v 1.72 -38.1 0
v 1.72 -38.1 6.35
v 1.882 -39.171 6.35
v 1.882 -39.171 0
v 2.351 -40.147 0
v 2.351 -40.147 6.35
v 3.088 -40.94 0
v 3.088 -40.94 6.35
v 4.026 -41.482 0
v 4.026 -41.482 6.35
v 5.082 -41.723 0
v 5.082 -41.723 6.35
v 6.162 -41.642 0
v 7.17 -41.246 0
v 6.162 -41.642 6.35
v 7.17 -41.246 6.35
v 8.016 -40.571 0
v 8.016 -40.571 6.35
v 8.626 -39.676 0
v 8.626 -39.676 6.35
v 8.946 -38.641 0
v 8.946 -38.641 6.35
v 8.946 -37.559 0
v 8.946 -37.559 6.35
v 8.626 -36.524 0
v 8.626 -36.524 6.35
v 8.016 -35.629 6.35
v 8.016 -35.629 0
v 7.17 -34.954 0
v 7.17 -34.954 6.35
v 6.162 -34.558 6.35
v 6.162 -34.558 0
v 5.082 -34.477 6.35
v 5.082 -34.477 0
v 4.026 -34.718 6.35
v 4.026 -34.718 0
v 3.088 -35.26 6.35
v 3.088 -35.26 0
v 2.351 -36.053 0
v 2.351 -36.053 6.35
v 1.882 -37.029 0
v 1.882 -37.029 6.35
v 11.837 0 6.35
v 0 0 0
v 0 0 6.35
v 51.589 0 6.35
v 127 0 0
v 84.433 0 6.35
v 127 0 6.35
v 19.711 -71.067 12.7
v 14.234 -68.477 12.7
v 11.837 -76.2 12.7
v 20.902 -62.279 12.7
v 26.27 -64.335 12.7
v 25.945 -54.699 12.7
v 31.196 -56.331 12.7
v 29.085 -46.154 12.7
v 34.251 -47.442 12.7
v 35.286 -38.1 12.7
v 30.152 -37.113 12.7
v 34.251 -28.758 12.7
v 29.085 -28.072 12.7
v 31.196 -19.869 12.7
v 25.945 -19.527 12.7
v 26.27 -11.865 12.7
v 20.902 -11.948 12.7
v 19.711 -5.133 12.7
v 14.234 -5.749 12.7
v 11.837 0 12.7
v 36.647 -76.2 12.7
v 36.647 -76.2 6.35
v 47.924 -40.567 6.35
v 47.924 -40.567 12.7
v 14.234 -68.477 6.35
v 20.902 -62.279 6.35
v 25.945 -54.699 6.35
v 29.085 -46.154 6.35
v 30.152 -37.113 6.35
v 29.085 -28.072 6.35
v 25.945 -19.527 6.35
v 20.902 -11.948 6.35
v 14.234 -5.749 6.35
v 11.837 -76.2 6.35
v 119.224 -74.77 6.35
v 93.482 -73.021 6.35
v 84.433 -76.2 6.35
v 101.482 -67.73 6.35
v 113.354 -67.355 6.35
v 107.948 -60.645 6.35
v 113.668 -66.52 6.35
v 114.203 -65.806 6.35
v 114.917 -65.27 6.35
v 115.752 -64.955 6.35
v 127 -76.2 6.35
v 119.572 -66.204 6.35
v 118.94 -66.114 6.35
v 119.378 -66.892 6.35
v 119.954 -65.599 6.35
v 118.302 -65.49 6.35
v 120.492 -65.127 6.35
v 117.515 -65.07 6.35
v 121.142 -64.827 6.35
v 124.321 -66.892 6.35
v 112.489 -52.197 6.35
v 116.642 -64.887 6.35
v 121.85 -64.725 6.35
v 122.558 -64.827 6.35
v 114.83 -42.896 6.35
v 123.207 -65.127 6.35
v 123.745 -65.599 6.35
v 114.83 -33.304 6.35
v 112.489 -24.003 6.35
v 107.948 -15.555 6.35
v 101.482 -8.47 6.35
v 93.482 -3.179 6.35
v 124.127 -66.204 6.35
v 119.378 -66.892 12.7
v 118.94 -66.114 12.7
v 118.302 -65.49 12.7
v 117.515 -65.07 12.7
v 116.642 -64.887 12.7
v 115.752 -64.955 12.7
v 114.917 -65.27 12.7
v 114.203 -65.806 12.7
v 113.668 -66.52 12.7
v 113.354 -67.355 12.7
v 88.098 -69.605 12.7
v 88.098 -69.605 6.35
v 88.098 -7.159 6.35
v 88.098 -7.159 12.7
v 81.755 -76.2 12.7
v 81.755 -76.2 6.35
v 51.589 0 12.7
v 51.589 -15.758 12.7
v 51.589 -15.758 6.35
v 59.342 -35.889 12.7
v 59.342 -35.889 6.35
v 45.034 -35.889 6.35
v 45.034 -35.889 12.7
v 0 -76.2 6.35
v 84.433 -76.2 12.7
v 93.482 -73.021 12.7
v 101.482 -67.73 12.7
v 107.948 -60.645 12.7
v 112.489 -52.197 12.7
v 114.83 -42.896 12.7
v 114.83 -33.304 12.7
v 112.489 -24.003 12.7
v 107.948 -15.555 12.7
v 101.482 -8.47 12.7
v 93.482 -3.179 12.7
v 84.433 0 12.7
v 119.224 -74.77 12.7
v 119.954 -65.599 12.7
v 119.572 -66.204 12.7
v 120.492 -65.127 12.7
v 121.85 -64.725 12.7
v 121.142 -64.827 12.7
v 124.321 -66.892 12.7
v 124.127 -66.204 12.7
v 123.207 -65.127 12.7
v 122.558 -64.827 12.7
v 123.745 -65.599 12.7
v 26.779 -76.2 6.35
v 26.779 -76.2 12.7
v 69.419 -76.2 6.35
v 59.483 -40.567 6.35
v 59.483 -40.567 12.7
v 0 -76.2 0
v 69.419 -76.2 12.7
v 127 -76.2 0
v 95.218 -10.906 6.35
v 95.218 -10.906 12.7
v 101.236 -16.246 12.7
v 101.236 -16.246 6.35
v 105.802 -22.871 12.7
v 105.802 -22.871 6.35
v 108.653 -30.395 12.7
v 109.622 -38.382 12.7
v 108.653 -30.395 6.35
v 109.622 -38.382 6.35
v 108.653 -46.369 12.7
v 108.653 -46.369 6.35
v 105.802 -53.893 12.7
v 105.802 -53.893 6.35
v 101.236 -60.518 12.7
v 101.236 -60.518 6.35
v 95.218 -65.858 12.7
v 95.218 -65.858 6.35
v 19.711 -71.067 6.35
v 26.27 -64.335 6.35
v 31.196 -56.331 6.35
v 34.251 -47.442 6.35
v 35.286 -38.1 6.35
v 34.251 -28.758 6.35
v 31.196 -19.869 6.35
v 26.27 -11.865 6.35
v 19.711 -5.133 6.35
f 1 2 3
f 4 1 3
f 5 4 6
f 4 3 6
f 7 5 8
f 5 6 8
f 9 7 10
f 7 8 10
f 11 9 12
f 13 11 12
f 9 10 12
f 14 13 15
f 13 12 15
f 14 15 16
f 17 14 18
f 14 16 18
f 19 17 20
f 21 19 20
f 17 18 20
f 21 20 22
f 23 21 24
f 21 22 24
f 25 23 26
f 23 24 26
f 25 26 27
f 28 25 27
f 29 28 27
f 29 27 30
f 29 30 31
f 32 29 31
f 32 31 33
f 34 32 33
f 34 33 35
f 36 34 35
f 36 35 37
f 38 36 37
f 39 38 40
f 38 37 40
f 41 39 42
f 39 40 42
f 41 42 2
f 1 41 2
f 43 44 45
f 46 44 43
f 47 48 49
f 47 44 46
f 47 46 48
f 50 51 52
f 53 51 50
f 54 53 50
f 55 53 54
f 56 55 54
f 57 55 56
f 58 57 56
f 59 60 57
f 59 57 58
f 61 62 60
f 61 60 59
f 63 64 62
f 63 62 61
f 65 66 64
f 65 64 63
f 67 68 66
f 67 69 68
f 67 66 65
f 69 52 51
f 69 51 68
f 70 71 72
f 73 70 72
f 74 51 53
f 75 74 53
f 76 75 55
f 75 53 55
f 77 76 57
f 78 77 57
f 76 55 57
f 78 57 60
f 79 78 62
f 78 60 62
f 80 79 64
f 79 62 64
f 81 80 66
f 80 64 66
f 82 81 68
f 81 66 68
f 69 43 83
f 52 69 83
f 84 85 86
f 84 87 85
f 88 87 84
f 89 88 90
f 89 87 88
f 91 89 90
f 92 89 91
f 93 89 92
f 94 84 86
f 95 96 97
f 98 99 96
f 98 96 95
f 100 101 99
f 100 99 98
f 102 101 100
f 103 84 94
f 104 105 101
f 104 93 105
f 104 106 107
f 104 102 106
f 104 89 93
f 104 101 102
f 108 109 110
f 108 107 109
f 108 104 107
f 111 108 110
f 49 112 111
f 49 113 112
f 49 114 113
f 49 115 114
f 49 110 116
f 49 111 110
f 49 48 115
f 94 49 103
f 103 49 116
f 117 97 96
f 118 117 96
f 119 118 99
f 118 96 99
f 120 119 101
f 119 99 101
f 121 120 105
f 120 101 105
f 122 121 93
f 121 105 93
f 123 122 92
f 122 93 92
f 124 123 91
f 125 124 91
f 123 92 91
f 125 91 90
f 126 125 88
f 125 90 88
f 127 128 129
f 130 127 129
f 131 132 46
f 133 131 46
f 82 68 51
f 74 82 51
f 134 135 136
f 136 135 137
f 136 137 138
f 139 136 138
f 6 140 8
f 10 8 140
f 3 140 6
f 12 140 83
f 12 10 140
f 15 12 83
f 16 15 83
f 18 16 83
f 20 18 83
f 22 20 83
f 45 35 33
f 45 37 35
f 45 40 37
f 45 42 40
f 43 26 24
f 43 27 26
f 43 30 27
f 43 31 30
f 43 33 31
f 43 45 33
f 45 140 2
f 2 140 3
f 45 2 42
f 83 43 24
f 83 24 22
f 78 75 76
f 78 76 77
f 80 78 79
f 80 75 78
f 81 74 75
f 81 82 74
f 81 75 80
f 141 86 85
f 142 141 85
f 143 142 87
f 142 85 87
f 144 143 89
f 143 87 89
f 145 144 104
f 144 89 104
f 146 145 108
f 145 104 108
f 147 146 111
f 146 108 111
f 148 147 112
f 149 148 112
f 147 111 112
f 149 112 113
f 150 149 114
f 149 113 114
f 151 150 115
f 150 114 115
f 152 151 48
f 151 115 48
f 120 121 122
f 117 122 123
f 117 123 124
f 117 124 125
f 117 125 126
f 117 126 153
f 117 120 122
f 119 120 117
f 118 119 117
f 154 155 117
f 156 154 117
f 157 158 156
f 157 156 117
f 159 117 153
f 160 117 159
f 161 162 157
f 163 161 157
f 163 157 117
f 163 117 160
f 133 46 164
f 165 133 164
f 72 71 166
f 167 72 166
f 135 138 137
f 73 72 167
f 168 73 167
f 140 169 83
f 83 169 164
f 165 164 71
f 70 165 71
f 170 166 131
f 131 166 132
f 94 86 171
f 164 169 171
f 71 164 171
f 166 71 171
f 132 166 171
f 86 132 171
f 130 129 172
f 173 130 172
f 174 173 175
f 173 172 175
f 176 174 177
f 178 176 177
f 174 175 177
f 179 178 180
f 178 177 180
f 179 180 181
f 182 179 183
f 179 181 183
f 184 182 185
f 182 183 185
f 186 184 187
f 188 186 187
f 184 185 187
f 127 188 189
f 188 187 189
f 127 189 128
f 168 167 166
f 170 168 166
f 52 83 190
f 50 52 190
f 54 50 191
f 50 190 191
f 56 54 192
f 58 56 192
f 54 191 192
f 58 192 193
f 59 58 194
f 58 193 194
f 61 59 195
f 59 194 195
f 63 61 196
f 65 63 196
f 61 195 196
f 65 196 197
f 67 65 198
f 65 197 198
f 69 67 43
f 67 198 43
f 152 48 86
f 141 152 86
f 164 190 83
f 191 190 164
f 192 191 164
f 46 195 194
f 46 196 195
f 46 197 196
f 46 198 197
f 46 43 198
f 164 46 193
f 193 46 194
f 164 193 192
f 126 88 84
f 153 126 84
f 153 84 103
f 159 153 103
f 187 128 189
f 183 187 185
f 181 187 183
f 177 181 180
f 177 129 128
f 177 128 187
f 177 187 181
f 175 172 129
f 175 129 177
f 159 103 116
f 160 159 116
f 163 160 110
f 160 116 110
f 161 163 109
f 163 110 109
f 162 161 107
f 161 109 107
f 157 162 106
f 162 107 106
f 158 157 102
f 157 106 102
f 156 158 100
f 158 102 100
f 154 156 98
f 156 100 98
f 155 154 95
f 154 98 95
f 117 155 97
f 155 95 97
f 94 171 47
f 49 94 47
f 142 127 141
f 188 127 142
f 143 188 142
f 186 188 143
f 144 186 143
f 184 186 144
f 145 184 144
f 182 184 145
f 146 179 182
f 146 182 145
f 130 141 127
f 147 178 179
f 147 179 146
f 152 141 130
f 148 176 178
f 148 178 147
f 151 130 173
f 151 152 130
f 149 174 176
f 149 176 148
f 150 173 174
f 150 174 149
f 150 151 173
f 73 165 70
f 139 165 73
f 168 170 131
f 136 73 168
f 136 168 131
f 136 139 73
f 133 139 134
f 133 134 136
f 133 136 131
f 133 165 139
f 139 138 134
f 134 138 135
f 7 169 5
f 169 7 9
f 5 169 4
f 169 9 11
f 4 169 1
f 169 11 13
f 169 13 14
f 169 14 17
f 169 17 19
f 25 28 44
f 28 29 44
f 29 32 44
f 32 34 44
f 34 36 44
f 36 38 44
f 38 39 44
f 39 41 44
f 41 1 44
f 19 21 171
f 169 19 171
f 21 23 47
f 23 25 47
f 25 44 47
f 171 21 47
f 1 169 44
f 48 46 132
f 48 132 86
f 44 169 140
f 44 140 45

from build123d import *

# Parameters (mm, degrees)
F0_W      = 127
F0_H      = 76.2
F1_DEPTH  = 6.35
F3_DEPTH  = 6.35
F5_DEPTH  = 6.35
F7_DEPTH  = 6.35
F9_DEPTH  = 6.35
F11_DEPTH = 6.35
F13_DEPTH = 6.35


with BuildPart() as f1:
    # F0 (on Top) → F1 (new body)
    with BuildSketch(Plane.XY):
        with Locations((63.5, -38.1)):
            Rectangle(F0_W, F0_H)
    extrude(amount=F1_DEPTH)

    # F2 (on face) → F3 (cut, through all)
    with BuildSketch(Plane.XY.offset(6.35)):
        with BuildLine():
            ThreePointArc((8.986218, -38.1), (5.353199, -34.466981), (1.72018, -38.1))
            ThreePointArc((1.72018, -38.1), (5.353199, -41.733019), (8.986218, -38.1))
        make_face()
    extrude(amount=-F3_DEPTH, mode=Mode.SUBTRACT)

    # F4 (on face) → F5 (join)
    with BuildSketch(Plane.XY.offset(6.35)):
        with BuildLine():
            ThreePointArc((11.837447, -76.2), (35.286069, -38.1), (11.837447, 0))
            Line((11.837447, 0), (11.837447, -76.2))
        make_face()
    extrude(amount=F5_DEPTH)

    # F6 (on face) → F7 (cut)
    with BuildSketch(Plane.XY.offset(12.7)):
        with BuildLine():
            ThreePointArc((14.233802, -68.477303), (30.151871, -37.113268), (14.233802, -5.749233))
            Line((14.233802, -5.749233), (14.233802, -68.477303))
        make_face()
    extrude(amount=-F7_DEPTH, mode=Mode.SUBTRACT)

    # F8 (on face) → F9 (join)
    with BuildSketch(Plane.XY.offset(6.35)):
        Polygon((81.754573, -76.2), (51.588718, 0), (26.779415, -76.2), (36.64675, -76.2), (47.923706, -40.566836), (59.482586, -40.566836), (69.418724, -76.2), align=None)
        Polygon((45.034298, -35.888964), (51.588718, -15.757531), (59.341624, -35.888964), align=None, mode=Mode.SUBTRACT)
    extrude(amount=F9_DEPTH)

    # F10 (on face) → F11 (join)
    with BuildSketch(Plane.XY.offset(6.35)):
        with BuildLine():
            Line((84.432848, 0), (84.432848, -76.2))
            ThreePointArc((84.432848, -76.2), (115.125997, -38.1), (84.432848, 0))
        make_face()
        with BuildLine():
            Line((88.097863, -69.604993), (88.097863, -7.158854))
            ThreePointArc((88.097863, -7.158854), (109.621547, -38.381923), (88.097863, -69.604993))
        make_face(mode=Mode.SUBTRACT)
    extrude(amount=F11_DEPTH)

    # F12 (on face) → F13 (join)
    with BuildSketch(Plane.XY.offset(6.35)):
        with BuildLine():
            ThreePointArc((119.378194, -66.891998), (116.194297, -64.889157), (113.354176, -67.355387))
            Line((113.354176, -67.355387), (119.223736, -74.769571))
            Line((119.223736, -74.769571), (124.320991, -66.891998))
            ThreePointArc((124.320991, -66.891998), (121.849593, -64.724744), (119.378194, -66.891998))
        make_face()
    extrude(amount=F13_DEPTH)


solid = f1.part
